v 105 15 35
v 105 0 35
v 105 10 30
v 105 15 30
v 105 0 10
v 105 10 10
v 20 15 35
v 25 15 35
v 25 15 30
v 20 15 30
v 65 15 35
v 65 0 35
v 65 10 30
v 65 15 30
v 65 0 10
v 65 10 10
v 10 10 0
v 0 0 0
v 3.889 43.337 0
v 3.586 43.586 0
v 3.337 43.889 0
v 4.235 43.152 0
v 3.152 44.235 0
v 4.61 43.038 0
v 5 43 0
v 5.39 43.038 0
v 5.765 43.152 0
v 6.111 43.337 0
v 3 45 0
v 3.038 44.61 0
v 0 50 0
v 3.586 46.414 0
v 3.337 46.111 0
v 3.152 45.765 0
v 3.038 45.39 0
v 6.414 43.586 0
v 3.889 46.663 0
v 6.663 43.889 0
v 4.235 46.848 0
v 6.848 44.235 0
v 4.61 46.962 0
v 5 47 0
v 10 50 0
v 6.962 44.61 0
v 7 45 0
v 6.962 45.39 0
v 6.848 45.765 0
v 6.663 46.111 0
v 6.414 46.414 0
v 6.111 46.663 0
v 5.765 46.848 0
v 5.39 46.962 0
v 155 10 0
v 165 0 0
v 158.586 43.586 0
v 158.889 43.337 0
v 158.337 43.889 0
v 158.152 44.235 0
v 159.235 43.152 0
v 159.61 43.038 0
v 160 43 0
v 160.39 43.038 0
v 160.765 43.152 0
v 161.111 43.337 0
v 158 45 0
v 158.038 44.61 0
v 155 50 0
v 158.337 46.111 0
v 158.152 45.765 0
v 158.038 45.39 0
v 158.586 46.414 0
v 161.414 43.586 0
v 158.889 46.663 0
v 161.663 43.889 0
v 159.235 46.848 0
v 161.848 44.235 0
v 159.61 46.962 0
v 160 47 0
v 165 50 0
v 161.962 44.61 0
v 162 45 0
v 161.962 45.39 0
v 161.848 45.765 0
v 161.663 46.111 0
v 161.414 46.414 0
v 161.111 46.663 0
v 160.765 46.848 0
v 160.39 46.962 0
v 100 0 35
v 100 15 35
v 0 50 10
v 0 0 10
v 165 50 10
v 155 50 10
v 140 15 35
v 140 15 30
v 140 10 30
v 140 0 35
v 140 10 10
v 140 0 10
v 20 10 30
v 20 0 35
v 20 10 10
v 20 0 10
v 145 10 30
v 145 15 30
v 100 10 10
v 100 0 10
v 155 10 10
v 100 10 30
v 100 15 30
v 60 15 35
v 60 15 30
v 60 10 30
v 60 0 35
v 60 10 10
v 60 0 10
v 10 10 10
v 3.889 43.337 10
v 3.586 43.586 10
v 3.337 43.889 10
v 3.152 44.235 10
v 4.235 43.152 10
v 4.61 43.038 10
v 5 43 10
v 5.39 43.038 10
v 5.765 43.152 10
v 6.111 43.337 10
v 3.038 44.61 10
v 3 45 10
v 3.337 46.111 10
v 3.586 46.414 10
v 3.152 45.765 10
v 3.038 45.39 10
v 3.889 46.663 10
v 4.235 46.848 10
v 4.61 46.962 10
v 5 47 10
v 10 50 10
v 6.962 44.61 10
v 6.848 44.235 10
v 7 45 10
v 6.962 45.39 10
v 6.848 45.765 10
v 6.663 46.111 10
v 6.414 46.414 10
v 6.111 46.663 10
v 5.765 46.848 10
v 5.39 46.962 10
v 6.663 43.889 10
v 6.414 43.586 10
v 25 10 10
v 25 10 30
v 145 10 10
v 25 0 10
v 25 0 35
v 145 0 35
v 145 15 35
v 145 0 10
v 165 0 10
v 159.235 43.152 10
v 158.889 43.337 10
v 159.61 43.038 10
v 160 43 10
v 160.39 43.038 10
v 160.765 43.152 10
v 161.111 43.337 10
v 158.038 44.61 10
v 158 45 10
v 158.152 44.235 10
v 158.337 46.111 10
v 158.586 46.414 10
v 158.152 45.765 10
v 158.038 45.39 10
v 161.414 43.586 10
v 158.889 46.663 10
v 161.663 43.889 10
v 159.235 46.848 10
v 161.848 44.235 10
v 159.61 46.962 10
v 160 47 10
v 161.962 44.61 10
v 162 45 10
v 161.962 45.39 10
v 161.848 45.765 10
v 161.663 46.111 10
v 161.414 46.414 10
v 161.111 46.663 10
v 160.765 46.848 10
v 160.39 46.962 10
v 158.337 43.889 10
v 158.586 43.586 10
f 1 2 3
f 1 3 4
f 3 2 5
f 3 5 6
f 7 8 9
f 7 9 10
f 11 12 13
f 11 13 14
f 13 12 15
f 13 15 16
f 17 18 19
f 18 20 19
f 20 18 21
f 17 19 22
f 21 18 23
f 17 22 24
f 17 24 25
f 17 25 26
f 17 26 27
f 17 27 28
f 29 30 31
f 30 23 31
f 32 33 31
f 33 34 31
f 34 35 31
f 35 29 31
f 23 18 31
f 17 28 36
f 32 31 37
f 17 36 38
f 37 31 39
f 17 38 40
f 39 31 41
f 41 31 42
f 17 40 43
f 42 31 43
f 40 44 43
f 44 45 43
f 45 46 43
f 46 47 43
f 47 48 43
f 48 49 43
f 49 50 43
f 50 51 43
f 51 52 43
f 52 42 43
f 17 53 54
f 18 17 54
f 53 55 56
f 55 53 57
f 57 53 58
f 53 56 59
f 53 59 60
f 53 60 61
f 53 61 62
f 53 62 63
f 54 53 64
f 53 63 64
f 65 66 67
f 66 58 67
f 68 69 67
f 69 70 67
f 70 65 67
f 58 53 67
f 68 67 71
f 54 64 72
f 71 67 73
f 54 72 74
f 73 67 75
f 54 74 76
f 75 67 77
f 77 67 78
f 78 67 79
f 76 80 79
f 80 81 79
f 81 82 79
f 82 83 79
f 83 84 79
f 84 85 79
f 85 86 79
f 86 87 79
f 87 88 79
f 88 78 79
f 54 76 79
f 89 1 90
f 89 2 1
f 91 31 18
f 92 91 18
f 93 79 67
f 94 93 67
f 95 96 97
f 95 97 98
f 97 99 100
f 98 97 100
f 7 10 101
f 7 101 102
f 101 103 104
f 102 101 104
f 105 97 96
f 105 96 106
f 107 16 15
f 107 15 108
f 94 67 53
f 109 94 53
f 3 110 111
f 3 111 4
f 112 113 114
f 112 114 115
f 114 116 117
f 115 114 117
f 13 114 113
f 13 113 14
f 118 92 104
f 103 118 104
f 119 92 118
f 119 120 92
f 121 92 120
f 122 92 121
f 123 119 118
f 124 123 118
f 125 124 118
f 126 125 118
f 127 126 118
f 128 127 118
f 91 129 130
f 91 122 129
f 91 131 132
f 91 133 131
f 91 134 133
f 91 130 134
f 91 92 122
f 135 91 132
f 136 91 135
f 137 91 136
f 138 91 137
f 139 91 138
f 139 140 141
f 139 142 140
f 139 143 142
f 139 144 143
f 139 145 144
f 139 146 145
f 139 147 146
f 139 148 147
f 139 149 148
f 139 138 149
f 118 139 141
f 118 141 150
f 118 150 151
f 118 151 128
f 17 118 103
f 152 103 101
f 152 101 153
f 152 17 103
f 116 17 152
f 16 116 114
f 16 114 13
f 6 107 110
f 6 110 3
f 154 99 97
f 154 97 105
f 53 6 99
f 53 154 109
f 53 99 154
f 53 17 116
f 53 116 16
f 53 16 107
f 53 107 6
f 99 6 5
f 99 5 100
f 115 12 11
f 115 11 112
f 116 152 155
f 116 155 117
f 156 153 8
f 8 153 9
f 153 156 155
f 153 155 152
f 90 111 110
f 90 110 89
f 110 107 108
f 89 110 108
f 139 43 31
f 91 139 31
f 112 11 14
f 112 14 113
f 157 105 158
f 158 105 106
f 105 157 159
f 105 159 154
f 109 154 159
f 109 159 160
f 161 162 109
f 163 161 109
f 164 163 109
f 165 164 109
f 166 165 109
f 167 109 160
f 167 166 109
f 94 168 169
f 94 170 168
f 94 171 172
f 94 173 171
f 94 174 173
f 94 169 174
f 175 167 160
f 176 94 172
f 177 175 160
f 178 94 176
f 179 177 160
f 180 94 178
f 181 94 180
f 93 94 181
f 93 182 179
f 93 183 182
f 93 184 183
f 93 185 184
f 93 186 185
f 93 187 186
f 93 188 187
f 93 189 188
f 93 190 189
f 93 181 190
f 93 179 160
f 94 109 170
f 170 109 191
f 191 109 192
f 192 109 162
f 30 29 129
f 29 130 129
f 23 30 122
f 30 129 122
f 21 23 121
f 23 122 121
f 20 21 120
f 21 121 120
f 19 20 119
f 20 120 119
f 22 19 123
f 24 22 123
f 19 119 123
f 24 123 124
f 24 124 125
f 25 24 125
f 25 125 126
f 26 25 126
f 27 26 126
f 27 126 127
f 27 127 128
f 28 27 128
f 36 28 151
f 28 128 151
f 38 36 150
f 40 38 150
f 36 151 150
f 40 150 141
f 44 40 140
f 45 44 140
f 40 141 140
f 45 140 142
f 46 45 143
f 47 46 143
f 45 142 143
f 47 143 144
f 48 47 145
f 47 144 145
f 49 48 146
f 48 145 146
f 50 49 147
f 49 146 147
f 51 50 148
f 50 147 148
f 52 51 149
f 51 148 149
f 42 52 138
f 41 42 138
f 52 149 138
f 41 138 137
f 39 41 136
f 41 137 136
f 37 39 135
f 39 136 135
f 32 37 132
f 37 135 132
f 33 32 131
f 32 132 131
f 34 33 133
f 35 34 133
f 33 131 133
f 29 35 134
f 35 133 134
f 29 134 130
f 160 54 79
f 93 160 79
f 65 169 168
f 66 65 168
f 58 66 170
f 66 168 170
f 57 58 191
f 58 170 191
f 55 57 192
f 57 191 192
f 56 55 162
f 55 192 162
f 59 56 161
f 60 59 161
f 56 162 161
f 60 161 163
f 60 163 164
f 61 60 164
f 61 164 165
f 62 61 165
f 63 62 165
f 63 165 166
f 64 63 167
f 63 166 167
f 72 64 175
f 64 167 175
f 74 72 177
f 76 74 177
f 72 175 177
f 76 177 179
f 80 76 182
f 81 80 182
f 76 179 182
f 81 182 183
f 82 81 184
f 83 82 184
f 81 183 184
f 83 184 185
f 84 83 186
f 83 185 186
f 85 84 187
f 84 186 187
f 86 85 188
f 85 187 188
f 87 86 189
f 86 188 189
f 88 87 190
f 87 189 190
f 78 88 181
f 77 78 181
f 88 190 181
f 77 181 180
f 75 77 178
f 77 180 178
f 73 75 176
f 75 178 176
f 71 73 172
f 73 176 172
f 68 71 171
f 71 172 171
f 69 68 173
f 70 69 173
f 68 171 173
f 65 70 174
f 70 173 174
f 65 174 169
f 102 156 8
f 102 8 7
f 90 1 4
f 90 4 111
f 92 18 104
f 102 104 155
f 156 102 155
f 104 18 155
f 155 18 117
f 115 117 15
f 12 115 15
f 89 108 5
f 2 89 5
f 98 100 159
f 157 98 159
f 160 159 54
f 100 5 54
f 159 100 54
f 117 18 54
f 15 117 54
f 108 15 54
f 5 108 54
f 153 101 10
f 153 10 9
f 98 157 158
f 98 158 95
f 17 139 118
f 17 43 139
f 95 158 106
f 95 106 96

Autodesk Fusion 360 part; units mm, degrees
sketch "Sketch1" plane through (0, 0, 0) normal (0, 0, 1) x (1, 0, 0)
  line L0 (0, 0) -> (165, 0)
  line L1 (165, 0) -> (165, 50)
  line L2 (165, 50) -> (0, 50)
  line L3 (0, 50) -> (0, 0)
  line L4 (0, 50) -> (10, 50)
  line L5 (10, 50) -> (10, 0)
  line L6 (10, 0) -> (0, 0)
  line L7 (0, 0) -> (0, 50)
  line L8 (165, 50) -> (155, 50)
  line L9 (155, 50) -> (155, 0)
  line L10 (155, 0) -> (165, 0)
  line L11 (165, 0) -> (165, 50)
  line L12 (0, 10) -> (165, 10)
  line L13 (165, 10) -> (165, 0)
  line L14 (165, 0) -> (0, 0)
  line L15 (0, 0) -> (0, 10)
  dimension "d1" = 165
  dimension "d2" = 50
  dimension "d3" = 10
  dimension "d4" = 10
  dimension "d5" = 50
extrude "Extrude1" add sketch "Sketch1" along normal blind 10 contours L0 L3 L5 L6 L7 L12 L14 L15 | L0 L5 L9 L12 L14 | L2 L3 L4 L5 L7 L12 | L0 L1 L9 L10 L11 L12 L13 L14 | L1 L2 L8 L9 L11 L12
sketch "Sketch2" plane through (0, 0, 10) normal (0, 0, 1) x (-1, 0, 0)
  line L0 (-165, 0) -> (-165, -50)
  line L1 (-165, -50) -> (-155, -50)
  line L2 (-155, -50) -> (-155, -10)
  line L3 (-155, -10) -> (-10, -10)
  line L4 (-10, -10) -> (-10, -50)
  line L5 (-10, -50) -> (0, -50)
  line L6 (0, -50) -> (0, 0)
  line L7 (0, 0) -> (-165, 0)
  circle A0 centre (-5, -45) radius 2
  circle A1 centre (-160, -45) radius 2
  dimension "d8" = 4
  dimension "d9" = 4
extrude "Extrude2" cut sketch "Sketch2" against normal blind 10 contours A0 | A1
sketch "Sketch3" plane through (0, 0, 10) normal (0, 0, 1) x (-1, 0, 0)
  circle A0 centre (-160, -45) radius 2
  circle A1 centre (-5, -45) radius 2
  line L0 (-165, 0) -> (-165, -50)
  line L1 (-165, -50) -> (-155, -50)
  line L2 (-155, -50) -> (-155, -10)
  line L3 (-155, -10) -> (-10, -10)
  line L4 (-10, -10) -> (-10, -50)
  line L5 (-10, -50) -> (0, -50)
  line L6 (0, -50) -> (0, 0)
  line L7 (0, 0) -> (-165, 0)
  line L8 (0, 0) -> (-20, 0)
  line L9 (-20, 0) -> (-25, 0)
  line L10 (-25, 0) -> (-25, -10)
  line L11 (-25, -10) -> (-20, -10)
  line L12 (-20, -10) -> (-20, 0)
  line L13 (-25, 0) -> (-60, 0)
  line L14 (-60, 0) -> (-65, 0)
  line L15 (-65, 0) -> (-65, -10)
  line L16 (-65, -10) -> (-60, -10)
  line L17 (-60, -10) -> (-60, 0)
  line L18 (-65, 0) -> (-100, 0)
  line L19 (-100, 0) -> (-105, 0)
  line L20 (-105, 0) -> (-105, -10)
  line L21 (-105, -10) -> (-100, -10)
  line L22 (-100, -10) -> (-100, 0)
  line L23 (-105, 0) -> (-140, 0)
  line L24 (-140, 0) -> (-145, 0)
  line L25 (-145, 0) -> (-145, -10)
  line L26 (-145, -10) -> (-140, -10)
  line L27 (-140, -10) -> (-140, 0)
  dimension "d12" = 20
  dimension "d13" = 5
  dimension "d14" = 10
  dimension "d15" = 35
  dimension "d16" = 35
  dimension "d17" = 35
extrude "Extrude3" add sketch "Sketch3" along normal blind 25 contours L3 L7 L24 L25 L26 L27 | L3 L7 L19 L20 L21 L22 | L3 L7 L14 L15 L16 L17 | L3 L7 L9 L10 L11 L12
sketch "Sketch4" plane through (0, 10, 0) normal (0, 1, 0) x (-1, 0, 0)
  line L0 (-155, 0) -> (-10, 0)
  line L1 (-10, 0) -> (-10, 10)
  line L2 (-10, 10) -> (-20, 10)
  line L3 (-20, 10) -> (-20, 35)
  line L4 (-20, 35) -> (-25, 35)
  line L5 (-25, 35) -> (-25, 10)
  line L6 (-25, 10) -> (-60, 10)
  line L7 (-60, 10) -> (-60, 35)
  line L8 (-60, 35) -> (-65, 35)
  line L9 (-65, 35) -> (-65, 10)
  line L10 (-65, 10) -> (-100, 10)
  line L11 (-100, 10) -> (-100, 35)
  line L12 (-100, 35) -> (-105, 35)
  line L13 (-105, 35) -> (-105, 10)
  line L14 (-105, 10) -> (-140, 10)
  line L15 (-140, 10) -> (-140, 35)
  line L16 (-140, 35) -> (-145, 35)
  line L17 (-145, 35) -> (-145, 10)
  line L18 (-145, 10) -> (-155, 10)
  line L19 (-155, 10) -> (-155, 0)
  line L20 (-20, 30) -> (-25, 30)
  line L21 (-25, 30) -> (-25, 35)
  line L22 (-25, 35) -> (-20, 35)
  line L23 (-20, 35) -> (-20, 30)
  line L24 (-60, 30) -> (-65, 30)
  line L25 (-65, 30) -> (-65, 35)
  line L26 (-65, 35) -> (-60, 35)
  line L27 (-60, 35) -> (-60, 30)
  line L28 (-100, 30) -> (-105, 30)
  line L29 (-105, 30) -> (-105, 35)
  line L30 (-105, 35) -> (-100, 35)
  line L31 (-100, 35) -> (-100, 30)
  line L32 (-140, 30) -> (-145, 30)
  line L33 (-145, 30) -> (-145, 35)
  line L34 (-145, 35) -> (-140, 35)
  line L35 (-140, 35) -> (-140, 30)
extrude "Extrude4" add sketch "Sketch4" along normal blind 5 contours L15 L16 L17 L32 L33 L34 L35 | L3 L4 L5 L20 L21 L22 L23 | L11 L12 L13 L28 L29 L30 L31 | L7 L8 L9 L24 L25 L26 L27
